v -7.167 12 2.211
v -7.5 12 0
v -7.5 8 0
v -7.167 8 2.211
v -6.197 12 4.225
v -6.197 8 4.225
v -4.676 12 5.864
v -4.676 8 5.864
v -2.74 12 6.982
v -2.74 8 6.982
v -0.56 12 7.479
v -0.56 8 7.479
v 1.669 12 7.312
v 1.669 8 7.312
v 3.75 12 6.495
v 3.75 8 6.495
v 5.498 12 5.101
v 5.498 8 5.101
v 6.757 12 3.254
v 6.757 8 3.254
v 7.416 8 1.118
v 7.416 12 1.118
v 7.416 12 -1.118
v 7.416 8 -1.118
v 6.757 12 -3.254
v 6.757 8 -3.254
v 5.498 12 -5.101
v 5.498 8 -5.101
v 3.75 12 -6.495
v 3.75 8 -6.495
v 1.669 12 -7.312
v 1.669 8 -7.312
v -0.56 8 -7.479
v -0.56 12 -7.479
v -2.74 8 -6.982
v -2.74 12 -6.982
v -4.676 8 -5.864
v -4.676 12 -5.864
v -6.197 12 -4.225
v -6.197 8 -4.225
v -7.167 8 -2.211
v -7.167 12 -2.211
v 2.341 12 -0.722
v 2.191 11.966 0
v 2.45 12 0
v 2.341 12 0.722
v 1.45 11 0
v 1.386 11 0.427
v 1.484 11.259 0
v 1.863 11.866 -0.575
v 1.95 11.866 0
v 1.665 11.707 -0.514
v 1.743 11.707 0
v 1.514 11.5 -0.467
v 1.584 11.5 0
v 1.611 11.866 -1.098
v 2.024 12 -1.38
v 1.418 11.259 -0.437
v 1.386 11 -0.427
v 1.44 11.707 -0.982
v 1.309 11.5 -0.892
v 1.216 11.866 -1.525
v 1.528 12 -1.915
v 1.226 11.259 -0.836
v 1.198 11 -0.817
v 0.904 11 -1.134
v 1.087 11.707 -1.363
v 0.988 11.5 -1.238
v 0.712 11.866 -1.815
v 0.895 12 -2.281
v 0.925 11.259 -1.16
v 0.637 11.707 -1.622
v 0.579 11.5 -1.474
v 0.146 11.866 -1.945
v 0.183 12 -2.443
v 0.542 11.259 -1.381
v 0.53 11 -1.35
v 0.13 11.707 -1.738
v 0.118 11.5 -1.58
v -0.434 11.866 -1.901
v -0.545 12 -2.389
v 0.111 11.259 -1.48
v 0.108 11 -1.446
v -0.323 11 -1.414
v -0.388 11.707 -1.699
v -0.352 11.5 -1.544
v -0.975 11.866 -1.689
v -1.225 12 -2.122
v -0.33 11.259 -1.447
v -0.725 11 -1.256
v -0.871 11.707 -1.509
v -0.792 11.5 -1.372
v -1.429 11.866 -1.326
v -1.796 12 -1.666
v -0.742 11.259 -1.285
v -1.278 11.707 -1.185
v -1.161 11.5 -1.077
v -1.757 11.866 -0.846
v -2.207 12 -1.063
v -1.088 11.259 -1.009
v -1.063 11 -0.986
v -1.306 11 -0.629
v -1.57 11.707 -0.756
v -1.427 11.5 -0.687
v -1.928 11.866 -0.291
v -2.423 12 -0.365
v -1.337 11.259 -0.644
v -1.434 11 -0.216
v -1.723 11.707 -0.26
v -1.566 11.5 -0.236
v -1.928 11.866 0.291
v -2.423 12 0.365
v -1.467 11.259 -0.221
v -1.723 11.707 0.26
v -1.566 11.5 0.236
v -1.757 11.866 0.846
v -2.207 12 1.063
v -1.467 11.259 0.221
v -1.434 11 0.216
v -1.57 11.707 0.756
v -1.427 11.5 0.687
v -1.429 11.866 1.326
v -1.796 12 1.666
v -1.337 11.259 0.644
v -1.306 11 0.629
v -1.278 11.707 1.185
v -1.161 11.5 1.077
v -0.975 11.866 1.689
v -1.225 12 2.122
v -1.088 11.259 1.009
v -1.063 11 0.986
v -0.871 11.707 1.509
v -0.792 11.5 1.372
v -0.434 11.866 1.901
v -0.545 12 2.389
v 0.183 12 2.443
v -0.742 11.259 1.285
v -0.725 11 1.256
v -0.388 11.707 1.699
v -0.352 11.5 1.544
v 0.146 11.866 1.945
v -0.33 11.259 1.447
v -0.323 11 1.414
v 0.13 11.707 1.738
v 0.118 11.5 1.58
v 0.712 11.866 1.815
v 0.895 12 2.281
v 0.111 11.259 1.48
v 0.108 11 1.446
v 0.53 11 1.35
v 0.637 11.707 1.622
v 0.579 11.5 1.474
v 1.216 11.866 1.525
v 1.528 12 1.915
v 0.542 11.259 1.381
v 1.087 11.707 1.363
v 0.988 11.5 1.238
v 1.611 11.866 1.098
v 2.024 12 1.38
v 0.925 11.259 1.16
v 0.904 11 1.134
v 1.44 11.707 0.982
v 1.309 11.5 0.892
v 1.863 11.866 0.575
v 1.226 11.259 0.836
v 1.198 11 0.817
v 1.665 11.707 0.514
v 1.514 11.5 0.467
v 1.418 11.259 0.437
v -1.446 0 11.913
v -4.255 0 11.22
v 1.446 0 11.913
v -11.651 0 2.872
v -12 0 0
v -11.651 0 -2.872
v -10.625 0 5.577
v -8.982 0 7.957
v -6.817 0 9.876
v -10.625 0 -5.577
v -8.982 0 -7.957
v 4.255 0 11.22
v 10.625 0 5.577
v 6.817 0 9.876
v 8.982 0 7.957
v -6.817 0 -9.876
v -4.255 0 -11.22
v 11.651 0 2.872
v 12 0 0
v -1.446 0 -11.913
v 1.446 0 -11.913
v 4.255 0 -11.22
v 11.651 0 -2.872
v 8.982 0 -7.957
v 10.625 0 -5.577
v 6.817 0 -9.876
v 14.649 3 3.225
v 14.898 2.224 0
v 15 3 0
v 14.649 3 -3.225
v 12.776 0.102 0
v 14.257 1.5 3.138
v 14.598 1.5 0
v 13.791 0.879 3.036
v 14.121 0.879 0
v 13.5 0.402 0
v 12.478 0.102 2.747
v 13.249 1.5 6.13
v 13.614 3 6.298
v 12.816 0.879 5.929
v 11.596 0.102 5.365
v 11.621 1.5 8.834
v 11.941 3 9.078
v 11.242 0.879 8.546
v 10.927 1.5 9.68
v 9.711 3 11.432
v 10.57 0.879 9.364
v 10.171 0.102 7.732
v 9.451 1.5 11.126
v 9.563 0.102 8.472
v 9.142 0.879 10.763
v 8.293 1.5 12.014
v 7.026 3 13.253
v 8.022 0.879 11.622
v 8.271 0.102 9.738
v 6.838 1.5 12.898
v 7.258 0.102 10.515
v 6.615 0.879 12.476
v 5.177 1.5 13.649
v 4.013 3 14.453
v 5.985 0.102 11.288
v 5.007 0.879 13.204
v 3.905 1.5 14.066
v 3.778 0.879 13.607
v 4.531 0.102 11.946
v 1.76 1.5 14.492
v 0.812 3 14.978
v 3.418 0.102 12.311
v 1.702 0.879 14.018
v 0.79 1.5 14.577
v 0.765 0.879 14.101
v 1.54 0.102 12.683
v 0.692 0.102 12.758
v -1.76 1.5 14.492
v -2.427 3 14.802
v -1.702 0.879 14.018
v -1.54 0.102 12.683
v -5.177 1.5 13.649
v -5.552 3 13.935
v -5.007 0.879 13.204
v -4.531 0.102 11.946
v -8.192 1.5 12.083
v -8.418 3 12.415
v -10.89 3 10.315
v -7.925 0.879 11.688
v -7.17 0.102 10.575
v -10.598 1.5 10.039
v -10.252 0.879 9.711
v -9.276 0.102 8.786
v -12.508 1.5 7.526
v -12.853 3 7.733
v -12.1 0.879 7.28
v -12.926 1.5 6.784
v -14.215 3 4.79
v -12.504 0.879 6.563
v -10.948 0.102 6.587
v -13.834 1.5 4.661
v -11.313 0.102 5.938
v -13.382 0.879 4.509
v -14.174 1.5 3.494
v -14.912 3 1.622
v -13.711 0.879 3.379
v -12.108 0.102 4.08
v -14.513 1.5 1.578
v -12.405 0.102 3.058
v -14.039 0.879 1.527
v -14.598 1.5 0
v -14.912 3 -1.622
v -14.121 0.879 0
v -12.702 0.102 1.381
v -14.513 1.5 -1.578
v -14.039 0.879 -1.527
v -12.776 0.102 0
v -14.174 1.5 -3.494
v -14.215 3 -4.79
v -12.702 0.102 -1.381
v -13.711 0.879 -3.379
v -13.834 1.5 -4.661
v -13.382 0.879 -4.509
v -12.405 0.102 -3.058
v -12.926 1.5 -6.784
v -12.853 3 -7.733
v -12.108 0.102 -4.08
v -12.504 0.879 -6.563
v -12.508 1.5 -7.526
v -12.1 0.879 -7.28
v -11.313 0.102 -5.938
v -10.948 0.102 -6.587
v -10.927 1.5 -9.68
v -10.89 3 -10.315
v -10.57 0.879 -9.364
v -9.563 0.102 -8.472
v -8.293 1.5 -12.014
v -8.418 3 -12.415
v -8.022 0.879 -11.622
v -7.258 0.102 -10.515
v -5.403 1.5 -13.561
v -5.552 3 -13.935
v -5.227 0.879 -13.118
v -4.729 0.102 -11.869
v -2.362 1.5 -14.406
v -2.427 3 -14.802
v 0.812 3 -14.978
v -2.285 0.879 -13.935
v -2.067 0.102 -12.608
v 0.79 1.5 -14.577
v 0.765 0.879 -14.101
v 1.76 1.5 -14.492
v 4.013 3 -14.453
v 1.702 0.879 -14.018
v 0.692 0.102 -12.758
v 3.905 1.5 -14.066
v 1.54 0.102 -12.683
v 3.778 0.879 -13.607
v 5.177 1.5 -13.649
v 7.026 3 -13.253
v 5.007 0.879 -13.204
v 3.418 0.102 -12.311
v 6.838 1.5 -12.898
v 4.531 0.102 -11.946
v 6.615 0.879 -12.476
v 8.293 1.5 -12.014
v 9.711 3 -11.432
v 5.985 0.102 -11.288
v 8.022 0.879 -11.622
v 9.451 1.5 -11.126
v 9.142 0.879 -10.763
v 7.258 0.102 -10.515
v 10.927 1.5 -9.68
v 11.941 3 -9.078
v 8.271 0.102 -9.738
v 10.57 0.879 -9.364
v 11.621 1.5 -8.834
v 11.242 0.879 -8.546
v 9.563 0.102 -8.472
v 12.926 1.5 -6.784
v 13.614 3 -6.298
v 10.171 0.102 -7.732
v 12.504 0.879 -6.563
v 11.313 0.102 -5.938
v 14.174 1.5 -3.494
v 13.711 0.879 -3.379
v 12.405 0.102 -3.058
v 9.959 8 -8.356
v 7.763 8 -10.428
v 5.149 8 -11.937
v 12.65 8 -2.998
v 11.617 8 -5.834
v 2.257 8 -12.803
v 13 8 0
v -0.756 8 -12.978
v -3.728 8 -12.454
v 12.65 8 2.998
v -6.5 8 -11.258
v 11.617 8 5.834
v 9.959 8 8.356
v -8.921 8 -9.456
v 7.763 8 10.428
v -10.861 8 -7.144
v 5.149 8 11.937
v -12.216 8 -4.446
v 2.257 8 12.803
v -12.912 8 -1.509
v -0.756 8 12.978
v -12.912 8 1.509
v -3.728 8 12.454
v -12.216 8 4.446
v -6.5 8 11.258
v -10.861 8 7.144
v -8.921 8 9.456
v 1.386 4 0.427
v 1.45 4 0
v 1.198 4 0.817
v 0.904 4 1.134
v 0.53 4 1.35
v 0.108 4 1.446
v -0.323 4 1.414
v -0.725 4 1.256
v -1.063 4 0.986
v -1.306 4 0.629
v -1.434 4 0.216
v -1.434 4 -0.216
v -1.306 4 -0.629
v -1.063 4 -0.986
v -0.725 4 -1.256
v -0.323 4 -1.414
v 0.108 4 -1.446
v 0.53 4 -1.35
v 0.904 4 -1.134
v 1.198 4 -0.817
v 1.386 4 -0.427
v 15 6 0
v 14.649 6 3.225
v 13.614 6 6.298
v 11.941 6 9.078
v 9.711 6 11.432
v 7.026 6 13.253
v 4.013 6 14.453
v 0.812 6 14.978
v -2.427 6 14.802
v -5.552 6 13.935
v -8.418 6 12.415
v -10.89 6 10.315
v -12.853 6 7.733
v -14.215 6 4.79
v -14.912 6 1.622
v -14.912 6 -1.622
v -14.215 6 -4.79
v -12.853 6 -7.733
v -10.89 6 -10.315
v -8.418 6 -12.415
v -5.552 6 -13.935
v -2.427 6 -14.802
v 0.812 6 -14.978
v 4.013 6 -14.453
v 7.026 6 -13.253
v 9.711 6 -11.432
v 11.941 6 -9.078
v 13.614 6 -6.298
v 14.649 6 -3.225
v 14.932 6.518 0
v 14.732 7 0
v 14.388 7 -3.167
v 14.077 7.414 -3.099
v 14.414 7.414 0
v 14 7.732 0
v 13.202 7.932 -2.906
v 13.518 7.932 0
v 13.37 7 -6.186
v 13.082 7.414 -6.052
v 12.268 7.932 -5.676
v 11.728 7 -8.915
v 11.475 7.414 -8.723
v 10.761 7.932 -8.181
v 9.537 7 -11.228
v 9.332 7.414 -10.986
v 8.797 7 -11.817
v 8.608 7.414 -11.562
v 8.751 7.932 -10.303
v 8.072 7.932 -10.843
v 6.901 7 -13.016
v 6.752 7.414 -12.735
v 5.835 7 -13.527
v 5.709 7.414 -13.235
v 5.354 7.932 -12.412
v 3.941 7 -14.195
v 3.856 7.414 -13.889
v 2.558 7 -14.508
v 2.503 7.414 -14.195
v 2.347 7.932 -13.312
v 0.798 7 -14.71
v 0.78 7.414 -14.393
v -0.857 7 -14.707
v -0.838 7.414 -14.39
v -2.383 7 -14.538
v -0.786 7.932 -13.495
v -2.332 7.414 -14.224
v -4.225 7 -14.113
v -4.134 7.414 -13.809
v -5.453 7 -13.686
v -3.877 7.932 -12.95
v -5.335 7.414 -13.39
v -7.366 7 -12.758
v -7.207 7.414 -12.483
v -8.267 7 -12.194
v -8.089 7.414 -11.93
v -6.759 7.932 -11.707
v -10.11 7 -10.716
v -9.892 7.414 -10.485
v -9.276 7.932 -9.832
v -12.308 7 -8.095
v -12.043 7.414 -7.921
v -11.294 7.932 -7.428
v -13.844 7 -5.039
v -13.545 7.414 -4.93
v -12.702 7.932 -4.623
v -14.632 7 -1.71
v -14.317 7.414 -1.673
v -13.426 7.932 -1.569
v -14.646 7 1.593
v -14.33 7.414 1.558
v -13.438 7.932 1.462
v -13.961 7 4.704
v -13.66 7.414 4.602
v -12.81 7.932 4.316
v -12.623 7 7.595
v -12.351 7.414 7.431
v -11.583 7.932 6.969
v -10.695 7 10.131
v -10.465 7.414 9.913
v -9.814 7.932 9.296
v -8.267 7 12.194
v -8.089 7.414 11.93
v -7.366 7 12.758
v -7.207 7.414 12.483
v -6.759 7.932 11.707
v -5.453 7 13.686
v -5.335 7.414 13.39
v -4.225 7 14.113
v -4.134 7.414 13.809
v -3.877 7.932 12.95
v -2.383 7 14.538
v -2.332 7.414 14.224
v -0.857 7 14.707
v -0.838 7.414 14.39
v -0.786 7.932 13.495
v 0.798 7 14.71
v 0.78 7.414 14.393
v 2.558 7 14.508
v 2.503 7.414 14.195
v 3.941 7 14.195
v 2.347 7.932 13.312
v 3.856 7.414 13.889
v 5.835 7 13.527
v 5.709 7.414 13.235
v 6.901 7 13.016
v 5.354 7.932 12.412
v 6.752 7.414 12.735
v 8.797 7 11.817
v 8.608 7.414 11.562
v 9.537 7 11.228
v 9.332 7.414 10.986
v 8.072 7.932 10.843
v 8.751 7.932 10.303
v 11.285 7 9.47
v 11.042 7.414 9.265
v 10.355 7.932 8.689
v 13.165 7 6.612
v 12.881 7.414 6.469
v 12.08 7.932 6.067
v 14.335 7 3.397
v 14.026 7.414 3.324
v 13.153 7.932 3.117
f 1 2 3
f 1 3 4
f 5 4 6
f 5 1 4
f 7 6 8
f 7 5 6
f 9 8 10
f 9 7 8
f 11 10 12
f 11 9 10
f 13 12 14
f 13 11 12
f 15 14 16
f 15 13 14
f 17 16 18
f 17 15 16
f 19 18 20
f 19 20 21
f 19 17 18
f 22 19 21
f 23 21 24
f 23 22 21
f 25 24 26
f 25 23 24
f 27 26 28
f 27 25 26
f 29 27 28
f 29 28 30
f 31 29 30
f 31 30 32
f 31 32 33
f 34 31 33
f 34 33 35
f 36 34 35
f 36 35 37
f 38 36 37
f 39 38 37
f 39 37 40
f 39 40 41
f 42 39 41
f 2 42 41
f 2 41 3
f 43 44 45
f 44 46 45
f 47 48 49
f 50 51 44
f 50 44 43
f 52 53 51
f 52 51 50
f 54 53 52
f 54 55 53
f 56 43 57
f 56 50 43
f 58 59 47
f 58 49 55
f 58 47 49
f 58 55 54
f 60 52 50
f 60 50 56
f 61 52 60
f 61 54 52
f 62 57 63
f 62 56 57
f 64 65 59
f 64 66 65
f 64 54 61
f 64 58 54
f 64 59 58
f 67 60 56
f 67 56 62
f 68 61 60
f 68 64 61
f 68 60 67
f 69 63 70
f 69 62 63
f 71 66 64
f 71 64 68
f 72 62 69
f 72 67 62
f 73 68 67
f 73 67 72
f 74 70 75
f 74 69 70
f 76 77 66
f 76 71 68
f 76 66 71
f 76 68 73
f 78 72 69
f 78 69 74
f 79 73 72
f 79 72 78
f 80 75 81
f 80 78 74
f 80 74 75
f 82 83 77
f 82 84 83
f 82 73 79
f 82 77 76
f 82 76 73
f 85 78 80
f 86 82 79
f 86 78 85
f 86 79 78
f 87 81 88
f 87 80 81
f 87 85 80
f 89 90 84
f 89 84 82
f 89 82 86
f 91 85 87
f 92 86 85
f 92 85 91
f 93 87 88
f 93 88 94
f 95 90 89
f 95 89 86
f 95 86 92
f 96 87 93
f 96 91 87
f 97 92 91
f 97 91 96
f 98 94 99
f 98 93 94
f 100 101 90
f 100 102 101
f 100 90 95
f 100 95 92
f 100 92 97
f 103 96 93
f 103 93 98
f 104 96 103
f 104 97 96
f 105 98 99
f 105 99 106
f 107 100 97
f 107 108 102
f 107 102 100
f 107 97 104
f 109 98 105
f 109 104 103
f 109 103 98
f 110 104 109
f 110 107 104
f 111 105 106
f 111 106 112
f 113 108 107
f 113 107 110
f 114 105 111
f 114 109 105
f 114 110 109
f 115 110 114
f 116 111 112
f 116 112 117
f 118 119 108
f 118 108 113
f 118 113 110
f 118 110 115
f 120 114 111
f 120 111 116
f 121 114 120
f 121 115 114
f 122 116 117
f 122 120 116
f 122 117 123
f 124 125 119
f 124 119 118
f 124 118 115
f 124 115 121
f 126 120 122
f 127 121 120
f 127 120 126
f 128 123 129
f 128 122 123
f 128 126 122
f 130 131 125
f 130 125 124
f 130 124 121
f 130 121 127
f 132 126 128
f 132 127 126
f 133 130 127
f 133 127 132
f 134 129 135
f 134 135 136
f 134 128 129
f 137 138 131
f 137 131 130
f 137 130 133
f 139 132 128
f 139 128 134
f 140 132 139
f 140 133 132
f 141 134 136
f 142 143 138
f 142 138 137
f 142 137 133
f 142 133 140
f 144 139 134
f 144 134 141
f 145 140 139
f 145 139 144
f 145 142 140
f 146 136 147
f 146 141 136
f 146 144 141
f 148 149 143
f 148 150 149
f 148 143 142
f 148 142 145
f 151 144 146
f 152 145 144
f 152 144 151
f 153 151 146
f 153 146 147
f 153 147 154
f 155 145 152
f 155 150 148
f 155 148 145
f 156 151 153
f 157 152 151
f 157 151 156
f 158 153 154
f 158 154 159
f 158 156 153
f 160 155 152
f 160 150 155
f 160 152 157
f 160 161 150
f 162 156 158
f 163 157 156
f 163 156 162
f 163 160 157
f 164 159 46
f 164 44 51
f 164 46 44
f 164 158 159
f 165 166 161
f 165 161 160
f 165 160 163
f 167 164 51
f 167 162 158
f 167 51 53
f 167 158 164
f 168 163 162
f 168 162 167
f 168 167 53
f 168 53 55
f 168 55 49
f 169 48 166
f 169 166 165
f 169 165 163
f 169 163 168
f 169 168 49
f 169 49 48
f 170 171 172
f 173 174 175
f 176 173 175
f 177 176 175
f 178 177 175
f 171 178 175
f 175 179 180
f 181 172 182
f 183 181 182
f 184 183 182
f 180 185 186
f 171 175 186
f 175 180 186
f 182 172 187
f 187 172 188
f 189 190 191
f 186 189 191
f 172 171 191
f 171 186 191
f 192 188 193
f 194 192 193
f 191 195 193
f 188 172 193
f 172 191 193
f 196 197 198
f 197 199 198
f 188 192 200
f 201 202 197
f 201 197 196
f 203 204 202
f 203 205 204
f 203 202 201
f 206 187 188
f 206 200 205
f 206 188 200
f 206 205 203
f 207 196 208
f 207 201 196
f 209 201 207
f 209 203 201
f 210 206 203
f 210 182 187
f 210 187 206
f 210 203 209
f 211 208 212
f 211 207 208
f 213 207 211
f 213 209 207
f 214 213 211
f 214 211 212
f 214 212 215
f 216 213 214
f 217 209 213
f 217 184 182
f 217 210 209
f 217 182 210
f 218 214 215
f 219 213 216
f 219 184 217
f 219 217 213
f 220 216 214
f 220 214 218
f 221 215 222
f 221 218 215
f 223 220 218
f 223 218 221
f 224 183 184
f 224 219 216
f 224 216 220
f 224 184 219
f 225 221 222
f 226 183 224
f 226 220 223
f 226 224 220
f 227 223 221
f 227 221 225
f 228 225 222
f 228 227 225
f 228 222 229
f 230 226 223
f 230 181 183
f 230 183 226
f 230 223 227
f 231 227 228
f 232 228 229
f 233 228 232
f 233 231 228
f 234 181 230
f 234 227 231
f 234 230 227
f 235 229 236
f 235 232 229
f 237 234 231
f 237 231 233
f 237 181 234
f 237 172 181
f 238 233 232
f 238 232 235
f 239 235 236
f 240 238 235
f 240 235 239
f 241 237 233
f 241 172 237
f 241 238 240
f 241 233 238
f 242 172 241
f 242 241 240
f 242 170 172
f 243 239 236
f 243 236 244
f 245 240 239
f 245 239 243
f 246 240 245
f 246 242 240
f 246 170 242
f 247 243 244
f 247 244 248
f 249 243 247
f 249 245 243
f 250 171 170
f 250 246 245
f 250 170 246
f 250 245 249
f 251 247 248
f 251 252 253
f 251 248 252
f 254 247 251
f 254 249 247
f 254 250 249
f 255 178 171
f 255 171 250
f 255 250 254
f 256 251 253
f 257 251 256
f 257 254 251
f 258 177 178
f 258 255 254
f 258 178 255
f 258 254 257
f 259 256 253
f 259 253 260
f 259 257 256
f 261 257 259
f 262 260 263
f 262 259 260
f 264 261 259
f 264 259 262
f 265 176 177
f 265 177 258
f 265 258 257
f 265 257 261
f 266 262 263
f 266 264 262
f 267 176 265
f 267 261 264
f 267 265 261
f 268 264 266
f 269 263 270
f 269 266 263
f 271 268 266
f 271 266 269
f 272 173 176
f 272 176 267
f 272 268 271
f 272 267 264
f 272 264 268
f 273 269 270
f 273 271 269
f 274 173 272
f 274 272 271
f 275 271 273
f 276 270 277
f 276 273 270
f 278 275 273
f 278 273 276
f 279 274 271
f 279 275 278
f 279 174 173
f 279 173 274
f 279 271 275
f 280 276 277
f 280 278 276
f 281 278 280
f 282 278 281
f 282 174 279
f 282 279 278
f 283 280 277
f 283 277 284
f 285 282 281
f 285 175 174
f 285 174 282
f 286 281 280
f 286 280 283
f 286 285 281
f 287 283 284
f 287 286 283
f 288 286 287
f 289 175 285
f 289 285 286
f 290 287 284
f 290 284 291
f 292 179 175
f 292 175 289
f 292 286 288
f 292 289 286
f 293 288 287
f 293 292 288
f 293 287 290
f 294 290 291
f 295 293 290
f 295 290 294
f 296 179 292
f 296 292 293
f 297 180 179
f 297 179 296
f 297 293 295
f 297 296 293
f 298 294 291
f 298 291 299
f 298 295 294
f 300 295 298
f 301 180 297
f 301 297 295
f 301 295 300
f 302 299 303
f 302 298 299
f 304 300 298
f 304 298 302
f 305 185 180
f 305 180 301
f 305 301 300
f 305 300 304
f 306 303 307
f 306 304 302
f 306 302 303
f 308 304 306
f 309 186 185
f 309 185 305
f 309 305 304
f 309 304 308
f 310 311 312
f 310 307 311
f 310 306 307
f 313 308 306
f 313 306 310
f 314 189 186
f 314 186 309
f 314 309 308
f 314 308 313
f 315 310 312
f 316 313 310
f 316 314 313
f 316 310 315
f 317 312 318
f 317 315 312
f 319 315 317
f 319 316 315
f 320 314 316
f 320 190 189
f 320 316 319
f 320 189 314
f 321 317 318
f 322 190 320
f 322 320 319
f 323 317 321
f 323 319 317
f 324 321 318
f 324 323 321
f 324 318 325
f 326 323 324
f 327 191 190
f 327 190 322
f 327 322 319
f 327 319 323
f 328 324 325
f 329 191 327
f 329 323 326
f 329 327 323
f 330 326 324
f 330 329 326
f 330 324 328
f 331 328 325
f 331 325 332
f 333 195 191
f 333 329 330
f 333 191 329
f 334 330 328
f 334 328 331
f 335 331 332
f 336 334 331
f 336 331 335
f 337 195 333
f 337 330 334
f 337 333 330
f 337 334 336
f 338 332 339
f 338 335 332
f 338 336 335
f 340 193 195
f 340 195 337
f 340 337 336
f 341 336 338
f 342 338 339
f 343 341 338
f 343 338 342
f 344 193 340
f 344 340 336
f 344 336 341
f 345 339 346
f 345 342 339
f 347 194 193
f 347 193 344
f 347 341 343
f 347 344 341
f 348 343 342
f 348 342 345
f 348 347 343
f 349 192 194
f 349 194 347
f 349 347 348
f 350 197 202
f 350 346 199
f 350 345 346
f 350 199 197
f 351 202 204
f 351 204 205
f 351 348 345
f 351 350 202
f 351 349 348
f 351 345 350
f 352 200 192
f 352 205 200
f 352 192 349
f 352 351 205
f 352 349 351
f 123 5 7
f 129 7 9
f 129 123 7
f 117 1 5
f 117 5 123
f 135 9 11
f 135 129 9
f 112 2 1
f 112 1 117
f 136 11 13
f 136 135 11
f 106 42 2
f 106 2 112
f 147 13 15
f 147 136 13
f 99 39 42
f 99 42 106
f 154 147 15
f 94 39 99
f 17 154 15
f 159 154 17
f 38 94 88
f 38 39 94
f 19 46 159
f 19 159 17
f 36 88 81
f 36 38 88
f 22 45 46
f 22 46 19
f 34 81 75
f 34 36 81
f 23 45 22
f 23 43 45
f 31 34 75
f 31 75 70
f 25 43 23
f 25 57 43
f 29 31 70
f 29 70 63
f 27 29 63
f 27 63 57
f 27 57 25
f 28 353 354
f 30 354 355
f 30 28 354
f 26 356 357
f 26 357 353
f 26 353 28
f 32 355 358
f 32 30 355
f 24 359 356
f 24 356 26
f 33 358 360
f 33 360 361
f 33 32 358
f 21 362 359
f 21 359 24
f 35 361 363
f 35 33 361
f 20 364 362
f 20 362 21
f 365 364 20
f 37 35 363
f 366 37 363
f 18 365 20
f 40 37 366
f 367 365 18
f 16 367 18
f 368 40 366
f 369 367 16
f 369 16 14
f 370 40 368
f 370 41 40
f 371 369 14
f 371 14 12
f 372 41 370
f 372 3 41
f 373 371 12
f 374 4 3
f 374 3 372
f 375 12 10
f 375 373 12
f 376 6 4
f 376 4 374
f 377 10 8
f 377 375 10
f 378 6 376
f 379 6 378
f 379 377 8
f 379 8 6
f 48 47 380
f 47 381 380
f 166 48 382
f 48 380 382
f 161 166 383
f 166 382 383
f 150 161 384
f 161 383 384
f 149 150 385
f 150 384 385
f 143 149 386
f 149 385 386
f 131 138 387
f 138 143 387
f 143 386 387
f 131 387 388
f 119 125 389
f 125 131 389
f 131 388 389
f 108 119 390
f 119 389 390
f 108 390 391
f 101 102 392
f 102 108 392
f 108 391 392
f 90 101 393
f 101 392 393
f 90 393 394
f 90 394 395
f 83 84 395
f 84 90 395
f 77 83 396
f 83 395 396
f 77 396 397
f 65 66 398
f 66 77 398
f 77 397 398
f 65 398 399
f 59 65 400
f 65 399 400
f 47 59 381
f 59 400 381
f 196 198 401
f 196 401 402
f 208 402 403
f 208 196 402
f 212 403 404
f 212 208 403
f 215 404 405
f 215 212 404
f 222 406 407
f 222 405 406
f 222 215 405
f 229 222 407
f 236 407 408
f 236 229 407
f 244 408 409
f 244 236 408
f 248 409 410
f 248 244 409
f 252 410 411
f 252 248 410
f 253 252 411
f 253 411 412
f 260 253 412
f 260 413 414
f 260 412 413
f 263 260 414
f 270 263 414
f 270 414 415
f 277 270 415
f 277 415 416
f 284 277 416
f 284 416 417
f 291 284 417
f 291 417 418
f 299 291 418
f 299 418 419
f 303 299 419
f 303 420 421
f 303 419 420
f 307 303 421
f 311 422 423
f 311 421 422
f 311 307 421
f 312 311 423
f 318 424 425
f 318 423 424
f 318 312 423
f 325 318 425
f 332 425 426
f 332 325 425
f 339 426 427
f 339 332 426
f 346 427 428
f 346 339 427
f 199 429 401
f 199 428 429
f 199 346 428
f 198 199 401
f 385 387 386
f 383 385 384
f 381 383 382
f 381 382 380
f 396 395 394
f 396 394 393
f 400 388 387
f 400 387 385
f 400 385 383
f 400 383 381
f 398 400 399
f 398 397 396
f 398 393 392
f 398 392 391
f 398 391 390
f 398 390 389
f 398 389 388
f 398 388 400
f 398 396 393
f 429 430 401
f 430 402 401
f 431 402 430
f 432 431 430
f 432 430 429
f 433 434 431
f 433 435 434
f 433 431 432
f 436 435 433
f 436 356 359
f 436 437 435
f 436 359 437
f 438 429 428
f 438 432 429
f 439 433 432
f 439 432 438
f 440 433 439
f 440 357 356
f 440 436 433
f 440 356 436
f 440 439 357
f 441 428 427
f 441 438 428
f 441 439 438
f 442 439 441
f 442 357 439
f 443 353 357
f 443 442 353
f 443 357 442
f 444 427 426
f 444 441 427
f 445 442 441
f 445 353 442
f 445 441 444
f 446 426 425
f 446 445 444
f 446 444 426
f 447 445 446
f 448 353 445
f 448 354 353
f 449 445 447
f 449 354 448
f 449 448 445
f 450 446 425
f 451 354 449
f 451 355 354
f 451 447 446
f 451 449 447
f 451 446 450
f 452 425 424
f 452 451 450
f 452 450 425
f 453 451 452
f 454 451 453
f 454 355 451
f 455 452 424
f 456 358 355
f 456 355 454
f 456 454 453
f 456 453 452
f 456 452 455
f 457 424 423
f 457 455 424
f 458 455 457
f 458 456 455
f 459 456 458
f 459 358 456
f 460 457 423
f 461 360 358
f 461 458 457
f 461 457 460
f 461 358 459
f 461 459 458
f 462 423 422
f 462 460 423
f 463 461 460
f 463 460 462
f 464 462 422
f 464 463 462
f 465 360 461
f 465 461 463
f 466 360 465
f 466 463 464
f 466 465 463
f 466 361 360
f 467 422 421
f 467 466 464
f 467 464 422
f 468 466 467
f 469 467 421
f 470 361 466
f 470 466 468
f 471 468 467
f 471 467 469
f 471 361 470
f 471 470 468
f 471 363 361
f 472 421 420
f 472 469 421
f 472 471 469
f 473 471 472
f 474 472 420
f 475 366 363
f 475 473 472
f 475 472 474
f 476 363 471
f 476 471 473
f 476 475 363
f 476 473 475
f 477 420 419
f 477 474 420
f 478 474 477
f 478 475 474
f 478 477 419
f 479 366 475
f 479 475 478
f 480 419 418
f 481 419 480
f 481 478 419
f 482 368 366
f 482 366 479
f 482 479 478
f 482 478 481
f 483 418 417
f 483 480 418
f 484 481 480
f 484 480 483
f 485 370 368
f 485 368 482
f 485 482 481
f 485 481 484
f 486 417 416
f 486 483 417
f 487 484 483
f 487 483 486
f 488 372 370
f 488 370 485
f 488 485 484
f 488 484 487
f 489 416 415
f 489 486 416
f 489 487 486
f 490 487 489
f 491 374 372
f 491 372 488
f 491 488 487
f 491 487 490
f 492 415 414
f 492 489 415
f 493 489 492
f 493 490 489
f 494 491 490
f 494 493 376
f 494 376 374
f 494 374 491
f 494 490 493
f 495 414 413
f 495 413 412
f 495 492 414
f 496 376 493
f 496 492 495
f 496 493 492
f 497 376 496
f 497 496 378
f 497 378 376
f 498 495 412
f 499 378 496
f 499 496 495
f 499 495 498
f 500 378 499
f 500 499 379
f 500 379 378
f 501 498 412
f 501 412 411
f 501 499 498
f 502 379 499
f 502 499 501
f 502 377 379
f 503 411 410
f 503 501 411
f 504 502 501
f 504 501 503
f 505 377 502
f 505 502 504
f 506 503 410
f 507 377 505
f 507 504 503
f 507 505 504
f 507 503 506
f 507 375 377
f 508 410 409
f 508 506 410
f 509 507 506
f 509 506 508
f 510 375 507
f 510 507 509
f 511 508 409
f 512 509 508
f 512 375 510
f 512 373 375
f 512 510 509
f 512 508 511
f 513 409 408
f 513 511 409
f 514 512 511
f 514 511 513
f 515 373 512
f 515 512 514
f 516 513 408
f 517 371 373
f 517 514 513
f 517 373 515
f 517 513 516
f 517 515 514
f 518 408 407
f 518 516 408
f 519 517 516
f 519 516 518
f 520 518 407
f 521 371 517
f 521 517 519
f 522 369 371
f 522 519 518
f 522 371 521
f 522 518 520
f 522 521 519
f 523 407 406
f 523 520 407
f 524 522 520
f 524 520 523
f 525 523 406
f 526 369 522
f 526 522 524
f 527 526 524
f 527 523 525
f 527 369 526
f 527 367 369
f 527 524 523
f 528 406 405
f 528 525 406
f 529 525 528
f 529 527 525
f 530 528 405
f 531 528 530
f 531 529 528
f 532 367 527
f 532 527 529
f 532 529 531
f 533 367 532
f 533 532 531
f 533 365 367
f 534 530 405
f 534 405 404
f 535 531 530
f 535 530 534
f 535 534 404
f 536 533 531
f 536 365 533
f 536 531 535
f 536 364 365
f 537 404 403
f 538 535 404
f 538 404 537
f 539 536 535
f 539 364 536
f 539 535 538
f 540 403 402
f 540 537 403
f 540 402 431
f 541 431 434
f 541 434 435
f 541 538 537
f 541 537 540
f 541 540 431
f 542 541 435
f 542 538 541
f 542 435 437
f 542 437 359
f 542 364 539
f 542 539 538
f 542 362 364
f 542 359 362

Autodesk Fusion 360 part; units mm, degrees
sketch "Sketch1" plane through (0, 0, 0) normal (0, 1, 0) x (1, 0, 0)
  circle A0 centre (0, 0) radius 1.45
  circle A1 centre (0, 0) radius 15
  dimension "d1" = 2.9
  dimension "d2" = 30
extrude "Extrude1" add sketch "Sketch1" along normal blind 12
extrude "Extrude2" add sketch "Sketch1" along normal blind 4 contours A0
fillet "Fillet1" radius 1 1 edges at (-1.3519, 12, -0.5243)
sketch "Sketch2" plane through (0, 12, 0) normal (0, 1, 0) x (-1, 0, 0)
  circle A0 centre (0, 0) radius 15
  circle A1 centre (0, 0) radius 2.45
  circle A2 centre (0, 0) radius 7.5
  dimension "d8" = 15
extrude "Extrude3" cut sketch "Sketch2" against normal blind 4 contours A0
fillet "Fillet2" radius 3 1 edges at (-13.9849, 0, 5.4242)
fillet "Fillet3" radius 2 1 edges at (-13.9849, 8, -5.4242)
